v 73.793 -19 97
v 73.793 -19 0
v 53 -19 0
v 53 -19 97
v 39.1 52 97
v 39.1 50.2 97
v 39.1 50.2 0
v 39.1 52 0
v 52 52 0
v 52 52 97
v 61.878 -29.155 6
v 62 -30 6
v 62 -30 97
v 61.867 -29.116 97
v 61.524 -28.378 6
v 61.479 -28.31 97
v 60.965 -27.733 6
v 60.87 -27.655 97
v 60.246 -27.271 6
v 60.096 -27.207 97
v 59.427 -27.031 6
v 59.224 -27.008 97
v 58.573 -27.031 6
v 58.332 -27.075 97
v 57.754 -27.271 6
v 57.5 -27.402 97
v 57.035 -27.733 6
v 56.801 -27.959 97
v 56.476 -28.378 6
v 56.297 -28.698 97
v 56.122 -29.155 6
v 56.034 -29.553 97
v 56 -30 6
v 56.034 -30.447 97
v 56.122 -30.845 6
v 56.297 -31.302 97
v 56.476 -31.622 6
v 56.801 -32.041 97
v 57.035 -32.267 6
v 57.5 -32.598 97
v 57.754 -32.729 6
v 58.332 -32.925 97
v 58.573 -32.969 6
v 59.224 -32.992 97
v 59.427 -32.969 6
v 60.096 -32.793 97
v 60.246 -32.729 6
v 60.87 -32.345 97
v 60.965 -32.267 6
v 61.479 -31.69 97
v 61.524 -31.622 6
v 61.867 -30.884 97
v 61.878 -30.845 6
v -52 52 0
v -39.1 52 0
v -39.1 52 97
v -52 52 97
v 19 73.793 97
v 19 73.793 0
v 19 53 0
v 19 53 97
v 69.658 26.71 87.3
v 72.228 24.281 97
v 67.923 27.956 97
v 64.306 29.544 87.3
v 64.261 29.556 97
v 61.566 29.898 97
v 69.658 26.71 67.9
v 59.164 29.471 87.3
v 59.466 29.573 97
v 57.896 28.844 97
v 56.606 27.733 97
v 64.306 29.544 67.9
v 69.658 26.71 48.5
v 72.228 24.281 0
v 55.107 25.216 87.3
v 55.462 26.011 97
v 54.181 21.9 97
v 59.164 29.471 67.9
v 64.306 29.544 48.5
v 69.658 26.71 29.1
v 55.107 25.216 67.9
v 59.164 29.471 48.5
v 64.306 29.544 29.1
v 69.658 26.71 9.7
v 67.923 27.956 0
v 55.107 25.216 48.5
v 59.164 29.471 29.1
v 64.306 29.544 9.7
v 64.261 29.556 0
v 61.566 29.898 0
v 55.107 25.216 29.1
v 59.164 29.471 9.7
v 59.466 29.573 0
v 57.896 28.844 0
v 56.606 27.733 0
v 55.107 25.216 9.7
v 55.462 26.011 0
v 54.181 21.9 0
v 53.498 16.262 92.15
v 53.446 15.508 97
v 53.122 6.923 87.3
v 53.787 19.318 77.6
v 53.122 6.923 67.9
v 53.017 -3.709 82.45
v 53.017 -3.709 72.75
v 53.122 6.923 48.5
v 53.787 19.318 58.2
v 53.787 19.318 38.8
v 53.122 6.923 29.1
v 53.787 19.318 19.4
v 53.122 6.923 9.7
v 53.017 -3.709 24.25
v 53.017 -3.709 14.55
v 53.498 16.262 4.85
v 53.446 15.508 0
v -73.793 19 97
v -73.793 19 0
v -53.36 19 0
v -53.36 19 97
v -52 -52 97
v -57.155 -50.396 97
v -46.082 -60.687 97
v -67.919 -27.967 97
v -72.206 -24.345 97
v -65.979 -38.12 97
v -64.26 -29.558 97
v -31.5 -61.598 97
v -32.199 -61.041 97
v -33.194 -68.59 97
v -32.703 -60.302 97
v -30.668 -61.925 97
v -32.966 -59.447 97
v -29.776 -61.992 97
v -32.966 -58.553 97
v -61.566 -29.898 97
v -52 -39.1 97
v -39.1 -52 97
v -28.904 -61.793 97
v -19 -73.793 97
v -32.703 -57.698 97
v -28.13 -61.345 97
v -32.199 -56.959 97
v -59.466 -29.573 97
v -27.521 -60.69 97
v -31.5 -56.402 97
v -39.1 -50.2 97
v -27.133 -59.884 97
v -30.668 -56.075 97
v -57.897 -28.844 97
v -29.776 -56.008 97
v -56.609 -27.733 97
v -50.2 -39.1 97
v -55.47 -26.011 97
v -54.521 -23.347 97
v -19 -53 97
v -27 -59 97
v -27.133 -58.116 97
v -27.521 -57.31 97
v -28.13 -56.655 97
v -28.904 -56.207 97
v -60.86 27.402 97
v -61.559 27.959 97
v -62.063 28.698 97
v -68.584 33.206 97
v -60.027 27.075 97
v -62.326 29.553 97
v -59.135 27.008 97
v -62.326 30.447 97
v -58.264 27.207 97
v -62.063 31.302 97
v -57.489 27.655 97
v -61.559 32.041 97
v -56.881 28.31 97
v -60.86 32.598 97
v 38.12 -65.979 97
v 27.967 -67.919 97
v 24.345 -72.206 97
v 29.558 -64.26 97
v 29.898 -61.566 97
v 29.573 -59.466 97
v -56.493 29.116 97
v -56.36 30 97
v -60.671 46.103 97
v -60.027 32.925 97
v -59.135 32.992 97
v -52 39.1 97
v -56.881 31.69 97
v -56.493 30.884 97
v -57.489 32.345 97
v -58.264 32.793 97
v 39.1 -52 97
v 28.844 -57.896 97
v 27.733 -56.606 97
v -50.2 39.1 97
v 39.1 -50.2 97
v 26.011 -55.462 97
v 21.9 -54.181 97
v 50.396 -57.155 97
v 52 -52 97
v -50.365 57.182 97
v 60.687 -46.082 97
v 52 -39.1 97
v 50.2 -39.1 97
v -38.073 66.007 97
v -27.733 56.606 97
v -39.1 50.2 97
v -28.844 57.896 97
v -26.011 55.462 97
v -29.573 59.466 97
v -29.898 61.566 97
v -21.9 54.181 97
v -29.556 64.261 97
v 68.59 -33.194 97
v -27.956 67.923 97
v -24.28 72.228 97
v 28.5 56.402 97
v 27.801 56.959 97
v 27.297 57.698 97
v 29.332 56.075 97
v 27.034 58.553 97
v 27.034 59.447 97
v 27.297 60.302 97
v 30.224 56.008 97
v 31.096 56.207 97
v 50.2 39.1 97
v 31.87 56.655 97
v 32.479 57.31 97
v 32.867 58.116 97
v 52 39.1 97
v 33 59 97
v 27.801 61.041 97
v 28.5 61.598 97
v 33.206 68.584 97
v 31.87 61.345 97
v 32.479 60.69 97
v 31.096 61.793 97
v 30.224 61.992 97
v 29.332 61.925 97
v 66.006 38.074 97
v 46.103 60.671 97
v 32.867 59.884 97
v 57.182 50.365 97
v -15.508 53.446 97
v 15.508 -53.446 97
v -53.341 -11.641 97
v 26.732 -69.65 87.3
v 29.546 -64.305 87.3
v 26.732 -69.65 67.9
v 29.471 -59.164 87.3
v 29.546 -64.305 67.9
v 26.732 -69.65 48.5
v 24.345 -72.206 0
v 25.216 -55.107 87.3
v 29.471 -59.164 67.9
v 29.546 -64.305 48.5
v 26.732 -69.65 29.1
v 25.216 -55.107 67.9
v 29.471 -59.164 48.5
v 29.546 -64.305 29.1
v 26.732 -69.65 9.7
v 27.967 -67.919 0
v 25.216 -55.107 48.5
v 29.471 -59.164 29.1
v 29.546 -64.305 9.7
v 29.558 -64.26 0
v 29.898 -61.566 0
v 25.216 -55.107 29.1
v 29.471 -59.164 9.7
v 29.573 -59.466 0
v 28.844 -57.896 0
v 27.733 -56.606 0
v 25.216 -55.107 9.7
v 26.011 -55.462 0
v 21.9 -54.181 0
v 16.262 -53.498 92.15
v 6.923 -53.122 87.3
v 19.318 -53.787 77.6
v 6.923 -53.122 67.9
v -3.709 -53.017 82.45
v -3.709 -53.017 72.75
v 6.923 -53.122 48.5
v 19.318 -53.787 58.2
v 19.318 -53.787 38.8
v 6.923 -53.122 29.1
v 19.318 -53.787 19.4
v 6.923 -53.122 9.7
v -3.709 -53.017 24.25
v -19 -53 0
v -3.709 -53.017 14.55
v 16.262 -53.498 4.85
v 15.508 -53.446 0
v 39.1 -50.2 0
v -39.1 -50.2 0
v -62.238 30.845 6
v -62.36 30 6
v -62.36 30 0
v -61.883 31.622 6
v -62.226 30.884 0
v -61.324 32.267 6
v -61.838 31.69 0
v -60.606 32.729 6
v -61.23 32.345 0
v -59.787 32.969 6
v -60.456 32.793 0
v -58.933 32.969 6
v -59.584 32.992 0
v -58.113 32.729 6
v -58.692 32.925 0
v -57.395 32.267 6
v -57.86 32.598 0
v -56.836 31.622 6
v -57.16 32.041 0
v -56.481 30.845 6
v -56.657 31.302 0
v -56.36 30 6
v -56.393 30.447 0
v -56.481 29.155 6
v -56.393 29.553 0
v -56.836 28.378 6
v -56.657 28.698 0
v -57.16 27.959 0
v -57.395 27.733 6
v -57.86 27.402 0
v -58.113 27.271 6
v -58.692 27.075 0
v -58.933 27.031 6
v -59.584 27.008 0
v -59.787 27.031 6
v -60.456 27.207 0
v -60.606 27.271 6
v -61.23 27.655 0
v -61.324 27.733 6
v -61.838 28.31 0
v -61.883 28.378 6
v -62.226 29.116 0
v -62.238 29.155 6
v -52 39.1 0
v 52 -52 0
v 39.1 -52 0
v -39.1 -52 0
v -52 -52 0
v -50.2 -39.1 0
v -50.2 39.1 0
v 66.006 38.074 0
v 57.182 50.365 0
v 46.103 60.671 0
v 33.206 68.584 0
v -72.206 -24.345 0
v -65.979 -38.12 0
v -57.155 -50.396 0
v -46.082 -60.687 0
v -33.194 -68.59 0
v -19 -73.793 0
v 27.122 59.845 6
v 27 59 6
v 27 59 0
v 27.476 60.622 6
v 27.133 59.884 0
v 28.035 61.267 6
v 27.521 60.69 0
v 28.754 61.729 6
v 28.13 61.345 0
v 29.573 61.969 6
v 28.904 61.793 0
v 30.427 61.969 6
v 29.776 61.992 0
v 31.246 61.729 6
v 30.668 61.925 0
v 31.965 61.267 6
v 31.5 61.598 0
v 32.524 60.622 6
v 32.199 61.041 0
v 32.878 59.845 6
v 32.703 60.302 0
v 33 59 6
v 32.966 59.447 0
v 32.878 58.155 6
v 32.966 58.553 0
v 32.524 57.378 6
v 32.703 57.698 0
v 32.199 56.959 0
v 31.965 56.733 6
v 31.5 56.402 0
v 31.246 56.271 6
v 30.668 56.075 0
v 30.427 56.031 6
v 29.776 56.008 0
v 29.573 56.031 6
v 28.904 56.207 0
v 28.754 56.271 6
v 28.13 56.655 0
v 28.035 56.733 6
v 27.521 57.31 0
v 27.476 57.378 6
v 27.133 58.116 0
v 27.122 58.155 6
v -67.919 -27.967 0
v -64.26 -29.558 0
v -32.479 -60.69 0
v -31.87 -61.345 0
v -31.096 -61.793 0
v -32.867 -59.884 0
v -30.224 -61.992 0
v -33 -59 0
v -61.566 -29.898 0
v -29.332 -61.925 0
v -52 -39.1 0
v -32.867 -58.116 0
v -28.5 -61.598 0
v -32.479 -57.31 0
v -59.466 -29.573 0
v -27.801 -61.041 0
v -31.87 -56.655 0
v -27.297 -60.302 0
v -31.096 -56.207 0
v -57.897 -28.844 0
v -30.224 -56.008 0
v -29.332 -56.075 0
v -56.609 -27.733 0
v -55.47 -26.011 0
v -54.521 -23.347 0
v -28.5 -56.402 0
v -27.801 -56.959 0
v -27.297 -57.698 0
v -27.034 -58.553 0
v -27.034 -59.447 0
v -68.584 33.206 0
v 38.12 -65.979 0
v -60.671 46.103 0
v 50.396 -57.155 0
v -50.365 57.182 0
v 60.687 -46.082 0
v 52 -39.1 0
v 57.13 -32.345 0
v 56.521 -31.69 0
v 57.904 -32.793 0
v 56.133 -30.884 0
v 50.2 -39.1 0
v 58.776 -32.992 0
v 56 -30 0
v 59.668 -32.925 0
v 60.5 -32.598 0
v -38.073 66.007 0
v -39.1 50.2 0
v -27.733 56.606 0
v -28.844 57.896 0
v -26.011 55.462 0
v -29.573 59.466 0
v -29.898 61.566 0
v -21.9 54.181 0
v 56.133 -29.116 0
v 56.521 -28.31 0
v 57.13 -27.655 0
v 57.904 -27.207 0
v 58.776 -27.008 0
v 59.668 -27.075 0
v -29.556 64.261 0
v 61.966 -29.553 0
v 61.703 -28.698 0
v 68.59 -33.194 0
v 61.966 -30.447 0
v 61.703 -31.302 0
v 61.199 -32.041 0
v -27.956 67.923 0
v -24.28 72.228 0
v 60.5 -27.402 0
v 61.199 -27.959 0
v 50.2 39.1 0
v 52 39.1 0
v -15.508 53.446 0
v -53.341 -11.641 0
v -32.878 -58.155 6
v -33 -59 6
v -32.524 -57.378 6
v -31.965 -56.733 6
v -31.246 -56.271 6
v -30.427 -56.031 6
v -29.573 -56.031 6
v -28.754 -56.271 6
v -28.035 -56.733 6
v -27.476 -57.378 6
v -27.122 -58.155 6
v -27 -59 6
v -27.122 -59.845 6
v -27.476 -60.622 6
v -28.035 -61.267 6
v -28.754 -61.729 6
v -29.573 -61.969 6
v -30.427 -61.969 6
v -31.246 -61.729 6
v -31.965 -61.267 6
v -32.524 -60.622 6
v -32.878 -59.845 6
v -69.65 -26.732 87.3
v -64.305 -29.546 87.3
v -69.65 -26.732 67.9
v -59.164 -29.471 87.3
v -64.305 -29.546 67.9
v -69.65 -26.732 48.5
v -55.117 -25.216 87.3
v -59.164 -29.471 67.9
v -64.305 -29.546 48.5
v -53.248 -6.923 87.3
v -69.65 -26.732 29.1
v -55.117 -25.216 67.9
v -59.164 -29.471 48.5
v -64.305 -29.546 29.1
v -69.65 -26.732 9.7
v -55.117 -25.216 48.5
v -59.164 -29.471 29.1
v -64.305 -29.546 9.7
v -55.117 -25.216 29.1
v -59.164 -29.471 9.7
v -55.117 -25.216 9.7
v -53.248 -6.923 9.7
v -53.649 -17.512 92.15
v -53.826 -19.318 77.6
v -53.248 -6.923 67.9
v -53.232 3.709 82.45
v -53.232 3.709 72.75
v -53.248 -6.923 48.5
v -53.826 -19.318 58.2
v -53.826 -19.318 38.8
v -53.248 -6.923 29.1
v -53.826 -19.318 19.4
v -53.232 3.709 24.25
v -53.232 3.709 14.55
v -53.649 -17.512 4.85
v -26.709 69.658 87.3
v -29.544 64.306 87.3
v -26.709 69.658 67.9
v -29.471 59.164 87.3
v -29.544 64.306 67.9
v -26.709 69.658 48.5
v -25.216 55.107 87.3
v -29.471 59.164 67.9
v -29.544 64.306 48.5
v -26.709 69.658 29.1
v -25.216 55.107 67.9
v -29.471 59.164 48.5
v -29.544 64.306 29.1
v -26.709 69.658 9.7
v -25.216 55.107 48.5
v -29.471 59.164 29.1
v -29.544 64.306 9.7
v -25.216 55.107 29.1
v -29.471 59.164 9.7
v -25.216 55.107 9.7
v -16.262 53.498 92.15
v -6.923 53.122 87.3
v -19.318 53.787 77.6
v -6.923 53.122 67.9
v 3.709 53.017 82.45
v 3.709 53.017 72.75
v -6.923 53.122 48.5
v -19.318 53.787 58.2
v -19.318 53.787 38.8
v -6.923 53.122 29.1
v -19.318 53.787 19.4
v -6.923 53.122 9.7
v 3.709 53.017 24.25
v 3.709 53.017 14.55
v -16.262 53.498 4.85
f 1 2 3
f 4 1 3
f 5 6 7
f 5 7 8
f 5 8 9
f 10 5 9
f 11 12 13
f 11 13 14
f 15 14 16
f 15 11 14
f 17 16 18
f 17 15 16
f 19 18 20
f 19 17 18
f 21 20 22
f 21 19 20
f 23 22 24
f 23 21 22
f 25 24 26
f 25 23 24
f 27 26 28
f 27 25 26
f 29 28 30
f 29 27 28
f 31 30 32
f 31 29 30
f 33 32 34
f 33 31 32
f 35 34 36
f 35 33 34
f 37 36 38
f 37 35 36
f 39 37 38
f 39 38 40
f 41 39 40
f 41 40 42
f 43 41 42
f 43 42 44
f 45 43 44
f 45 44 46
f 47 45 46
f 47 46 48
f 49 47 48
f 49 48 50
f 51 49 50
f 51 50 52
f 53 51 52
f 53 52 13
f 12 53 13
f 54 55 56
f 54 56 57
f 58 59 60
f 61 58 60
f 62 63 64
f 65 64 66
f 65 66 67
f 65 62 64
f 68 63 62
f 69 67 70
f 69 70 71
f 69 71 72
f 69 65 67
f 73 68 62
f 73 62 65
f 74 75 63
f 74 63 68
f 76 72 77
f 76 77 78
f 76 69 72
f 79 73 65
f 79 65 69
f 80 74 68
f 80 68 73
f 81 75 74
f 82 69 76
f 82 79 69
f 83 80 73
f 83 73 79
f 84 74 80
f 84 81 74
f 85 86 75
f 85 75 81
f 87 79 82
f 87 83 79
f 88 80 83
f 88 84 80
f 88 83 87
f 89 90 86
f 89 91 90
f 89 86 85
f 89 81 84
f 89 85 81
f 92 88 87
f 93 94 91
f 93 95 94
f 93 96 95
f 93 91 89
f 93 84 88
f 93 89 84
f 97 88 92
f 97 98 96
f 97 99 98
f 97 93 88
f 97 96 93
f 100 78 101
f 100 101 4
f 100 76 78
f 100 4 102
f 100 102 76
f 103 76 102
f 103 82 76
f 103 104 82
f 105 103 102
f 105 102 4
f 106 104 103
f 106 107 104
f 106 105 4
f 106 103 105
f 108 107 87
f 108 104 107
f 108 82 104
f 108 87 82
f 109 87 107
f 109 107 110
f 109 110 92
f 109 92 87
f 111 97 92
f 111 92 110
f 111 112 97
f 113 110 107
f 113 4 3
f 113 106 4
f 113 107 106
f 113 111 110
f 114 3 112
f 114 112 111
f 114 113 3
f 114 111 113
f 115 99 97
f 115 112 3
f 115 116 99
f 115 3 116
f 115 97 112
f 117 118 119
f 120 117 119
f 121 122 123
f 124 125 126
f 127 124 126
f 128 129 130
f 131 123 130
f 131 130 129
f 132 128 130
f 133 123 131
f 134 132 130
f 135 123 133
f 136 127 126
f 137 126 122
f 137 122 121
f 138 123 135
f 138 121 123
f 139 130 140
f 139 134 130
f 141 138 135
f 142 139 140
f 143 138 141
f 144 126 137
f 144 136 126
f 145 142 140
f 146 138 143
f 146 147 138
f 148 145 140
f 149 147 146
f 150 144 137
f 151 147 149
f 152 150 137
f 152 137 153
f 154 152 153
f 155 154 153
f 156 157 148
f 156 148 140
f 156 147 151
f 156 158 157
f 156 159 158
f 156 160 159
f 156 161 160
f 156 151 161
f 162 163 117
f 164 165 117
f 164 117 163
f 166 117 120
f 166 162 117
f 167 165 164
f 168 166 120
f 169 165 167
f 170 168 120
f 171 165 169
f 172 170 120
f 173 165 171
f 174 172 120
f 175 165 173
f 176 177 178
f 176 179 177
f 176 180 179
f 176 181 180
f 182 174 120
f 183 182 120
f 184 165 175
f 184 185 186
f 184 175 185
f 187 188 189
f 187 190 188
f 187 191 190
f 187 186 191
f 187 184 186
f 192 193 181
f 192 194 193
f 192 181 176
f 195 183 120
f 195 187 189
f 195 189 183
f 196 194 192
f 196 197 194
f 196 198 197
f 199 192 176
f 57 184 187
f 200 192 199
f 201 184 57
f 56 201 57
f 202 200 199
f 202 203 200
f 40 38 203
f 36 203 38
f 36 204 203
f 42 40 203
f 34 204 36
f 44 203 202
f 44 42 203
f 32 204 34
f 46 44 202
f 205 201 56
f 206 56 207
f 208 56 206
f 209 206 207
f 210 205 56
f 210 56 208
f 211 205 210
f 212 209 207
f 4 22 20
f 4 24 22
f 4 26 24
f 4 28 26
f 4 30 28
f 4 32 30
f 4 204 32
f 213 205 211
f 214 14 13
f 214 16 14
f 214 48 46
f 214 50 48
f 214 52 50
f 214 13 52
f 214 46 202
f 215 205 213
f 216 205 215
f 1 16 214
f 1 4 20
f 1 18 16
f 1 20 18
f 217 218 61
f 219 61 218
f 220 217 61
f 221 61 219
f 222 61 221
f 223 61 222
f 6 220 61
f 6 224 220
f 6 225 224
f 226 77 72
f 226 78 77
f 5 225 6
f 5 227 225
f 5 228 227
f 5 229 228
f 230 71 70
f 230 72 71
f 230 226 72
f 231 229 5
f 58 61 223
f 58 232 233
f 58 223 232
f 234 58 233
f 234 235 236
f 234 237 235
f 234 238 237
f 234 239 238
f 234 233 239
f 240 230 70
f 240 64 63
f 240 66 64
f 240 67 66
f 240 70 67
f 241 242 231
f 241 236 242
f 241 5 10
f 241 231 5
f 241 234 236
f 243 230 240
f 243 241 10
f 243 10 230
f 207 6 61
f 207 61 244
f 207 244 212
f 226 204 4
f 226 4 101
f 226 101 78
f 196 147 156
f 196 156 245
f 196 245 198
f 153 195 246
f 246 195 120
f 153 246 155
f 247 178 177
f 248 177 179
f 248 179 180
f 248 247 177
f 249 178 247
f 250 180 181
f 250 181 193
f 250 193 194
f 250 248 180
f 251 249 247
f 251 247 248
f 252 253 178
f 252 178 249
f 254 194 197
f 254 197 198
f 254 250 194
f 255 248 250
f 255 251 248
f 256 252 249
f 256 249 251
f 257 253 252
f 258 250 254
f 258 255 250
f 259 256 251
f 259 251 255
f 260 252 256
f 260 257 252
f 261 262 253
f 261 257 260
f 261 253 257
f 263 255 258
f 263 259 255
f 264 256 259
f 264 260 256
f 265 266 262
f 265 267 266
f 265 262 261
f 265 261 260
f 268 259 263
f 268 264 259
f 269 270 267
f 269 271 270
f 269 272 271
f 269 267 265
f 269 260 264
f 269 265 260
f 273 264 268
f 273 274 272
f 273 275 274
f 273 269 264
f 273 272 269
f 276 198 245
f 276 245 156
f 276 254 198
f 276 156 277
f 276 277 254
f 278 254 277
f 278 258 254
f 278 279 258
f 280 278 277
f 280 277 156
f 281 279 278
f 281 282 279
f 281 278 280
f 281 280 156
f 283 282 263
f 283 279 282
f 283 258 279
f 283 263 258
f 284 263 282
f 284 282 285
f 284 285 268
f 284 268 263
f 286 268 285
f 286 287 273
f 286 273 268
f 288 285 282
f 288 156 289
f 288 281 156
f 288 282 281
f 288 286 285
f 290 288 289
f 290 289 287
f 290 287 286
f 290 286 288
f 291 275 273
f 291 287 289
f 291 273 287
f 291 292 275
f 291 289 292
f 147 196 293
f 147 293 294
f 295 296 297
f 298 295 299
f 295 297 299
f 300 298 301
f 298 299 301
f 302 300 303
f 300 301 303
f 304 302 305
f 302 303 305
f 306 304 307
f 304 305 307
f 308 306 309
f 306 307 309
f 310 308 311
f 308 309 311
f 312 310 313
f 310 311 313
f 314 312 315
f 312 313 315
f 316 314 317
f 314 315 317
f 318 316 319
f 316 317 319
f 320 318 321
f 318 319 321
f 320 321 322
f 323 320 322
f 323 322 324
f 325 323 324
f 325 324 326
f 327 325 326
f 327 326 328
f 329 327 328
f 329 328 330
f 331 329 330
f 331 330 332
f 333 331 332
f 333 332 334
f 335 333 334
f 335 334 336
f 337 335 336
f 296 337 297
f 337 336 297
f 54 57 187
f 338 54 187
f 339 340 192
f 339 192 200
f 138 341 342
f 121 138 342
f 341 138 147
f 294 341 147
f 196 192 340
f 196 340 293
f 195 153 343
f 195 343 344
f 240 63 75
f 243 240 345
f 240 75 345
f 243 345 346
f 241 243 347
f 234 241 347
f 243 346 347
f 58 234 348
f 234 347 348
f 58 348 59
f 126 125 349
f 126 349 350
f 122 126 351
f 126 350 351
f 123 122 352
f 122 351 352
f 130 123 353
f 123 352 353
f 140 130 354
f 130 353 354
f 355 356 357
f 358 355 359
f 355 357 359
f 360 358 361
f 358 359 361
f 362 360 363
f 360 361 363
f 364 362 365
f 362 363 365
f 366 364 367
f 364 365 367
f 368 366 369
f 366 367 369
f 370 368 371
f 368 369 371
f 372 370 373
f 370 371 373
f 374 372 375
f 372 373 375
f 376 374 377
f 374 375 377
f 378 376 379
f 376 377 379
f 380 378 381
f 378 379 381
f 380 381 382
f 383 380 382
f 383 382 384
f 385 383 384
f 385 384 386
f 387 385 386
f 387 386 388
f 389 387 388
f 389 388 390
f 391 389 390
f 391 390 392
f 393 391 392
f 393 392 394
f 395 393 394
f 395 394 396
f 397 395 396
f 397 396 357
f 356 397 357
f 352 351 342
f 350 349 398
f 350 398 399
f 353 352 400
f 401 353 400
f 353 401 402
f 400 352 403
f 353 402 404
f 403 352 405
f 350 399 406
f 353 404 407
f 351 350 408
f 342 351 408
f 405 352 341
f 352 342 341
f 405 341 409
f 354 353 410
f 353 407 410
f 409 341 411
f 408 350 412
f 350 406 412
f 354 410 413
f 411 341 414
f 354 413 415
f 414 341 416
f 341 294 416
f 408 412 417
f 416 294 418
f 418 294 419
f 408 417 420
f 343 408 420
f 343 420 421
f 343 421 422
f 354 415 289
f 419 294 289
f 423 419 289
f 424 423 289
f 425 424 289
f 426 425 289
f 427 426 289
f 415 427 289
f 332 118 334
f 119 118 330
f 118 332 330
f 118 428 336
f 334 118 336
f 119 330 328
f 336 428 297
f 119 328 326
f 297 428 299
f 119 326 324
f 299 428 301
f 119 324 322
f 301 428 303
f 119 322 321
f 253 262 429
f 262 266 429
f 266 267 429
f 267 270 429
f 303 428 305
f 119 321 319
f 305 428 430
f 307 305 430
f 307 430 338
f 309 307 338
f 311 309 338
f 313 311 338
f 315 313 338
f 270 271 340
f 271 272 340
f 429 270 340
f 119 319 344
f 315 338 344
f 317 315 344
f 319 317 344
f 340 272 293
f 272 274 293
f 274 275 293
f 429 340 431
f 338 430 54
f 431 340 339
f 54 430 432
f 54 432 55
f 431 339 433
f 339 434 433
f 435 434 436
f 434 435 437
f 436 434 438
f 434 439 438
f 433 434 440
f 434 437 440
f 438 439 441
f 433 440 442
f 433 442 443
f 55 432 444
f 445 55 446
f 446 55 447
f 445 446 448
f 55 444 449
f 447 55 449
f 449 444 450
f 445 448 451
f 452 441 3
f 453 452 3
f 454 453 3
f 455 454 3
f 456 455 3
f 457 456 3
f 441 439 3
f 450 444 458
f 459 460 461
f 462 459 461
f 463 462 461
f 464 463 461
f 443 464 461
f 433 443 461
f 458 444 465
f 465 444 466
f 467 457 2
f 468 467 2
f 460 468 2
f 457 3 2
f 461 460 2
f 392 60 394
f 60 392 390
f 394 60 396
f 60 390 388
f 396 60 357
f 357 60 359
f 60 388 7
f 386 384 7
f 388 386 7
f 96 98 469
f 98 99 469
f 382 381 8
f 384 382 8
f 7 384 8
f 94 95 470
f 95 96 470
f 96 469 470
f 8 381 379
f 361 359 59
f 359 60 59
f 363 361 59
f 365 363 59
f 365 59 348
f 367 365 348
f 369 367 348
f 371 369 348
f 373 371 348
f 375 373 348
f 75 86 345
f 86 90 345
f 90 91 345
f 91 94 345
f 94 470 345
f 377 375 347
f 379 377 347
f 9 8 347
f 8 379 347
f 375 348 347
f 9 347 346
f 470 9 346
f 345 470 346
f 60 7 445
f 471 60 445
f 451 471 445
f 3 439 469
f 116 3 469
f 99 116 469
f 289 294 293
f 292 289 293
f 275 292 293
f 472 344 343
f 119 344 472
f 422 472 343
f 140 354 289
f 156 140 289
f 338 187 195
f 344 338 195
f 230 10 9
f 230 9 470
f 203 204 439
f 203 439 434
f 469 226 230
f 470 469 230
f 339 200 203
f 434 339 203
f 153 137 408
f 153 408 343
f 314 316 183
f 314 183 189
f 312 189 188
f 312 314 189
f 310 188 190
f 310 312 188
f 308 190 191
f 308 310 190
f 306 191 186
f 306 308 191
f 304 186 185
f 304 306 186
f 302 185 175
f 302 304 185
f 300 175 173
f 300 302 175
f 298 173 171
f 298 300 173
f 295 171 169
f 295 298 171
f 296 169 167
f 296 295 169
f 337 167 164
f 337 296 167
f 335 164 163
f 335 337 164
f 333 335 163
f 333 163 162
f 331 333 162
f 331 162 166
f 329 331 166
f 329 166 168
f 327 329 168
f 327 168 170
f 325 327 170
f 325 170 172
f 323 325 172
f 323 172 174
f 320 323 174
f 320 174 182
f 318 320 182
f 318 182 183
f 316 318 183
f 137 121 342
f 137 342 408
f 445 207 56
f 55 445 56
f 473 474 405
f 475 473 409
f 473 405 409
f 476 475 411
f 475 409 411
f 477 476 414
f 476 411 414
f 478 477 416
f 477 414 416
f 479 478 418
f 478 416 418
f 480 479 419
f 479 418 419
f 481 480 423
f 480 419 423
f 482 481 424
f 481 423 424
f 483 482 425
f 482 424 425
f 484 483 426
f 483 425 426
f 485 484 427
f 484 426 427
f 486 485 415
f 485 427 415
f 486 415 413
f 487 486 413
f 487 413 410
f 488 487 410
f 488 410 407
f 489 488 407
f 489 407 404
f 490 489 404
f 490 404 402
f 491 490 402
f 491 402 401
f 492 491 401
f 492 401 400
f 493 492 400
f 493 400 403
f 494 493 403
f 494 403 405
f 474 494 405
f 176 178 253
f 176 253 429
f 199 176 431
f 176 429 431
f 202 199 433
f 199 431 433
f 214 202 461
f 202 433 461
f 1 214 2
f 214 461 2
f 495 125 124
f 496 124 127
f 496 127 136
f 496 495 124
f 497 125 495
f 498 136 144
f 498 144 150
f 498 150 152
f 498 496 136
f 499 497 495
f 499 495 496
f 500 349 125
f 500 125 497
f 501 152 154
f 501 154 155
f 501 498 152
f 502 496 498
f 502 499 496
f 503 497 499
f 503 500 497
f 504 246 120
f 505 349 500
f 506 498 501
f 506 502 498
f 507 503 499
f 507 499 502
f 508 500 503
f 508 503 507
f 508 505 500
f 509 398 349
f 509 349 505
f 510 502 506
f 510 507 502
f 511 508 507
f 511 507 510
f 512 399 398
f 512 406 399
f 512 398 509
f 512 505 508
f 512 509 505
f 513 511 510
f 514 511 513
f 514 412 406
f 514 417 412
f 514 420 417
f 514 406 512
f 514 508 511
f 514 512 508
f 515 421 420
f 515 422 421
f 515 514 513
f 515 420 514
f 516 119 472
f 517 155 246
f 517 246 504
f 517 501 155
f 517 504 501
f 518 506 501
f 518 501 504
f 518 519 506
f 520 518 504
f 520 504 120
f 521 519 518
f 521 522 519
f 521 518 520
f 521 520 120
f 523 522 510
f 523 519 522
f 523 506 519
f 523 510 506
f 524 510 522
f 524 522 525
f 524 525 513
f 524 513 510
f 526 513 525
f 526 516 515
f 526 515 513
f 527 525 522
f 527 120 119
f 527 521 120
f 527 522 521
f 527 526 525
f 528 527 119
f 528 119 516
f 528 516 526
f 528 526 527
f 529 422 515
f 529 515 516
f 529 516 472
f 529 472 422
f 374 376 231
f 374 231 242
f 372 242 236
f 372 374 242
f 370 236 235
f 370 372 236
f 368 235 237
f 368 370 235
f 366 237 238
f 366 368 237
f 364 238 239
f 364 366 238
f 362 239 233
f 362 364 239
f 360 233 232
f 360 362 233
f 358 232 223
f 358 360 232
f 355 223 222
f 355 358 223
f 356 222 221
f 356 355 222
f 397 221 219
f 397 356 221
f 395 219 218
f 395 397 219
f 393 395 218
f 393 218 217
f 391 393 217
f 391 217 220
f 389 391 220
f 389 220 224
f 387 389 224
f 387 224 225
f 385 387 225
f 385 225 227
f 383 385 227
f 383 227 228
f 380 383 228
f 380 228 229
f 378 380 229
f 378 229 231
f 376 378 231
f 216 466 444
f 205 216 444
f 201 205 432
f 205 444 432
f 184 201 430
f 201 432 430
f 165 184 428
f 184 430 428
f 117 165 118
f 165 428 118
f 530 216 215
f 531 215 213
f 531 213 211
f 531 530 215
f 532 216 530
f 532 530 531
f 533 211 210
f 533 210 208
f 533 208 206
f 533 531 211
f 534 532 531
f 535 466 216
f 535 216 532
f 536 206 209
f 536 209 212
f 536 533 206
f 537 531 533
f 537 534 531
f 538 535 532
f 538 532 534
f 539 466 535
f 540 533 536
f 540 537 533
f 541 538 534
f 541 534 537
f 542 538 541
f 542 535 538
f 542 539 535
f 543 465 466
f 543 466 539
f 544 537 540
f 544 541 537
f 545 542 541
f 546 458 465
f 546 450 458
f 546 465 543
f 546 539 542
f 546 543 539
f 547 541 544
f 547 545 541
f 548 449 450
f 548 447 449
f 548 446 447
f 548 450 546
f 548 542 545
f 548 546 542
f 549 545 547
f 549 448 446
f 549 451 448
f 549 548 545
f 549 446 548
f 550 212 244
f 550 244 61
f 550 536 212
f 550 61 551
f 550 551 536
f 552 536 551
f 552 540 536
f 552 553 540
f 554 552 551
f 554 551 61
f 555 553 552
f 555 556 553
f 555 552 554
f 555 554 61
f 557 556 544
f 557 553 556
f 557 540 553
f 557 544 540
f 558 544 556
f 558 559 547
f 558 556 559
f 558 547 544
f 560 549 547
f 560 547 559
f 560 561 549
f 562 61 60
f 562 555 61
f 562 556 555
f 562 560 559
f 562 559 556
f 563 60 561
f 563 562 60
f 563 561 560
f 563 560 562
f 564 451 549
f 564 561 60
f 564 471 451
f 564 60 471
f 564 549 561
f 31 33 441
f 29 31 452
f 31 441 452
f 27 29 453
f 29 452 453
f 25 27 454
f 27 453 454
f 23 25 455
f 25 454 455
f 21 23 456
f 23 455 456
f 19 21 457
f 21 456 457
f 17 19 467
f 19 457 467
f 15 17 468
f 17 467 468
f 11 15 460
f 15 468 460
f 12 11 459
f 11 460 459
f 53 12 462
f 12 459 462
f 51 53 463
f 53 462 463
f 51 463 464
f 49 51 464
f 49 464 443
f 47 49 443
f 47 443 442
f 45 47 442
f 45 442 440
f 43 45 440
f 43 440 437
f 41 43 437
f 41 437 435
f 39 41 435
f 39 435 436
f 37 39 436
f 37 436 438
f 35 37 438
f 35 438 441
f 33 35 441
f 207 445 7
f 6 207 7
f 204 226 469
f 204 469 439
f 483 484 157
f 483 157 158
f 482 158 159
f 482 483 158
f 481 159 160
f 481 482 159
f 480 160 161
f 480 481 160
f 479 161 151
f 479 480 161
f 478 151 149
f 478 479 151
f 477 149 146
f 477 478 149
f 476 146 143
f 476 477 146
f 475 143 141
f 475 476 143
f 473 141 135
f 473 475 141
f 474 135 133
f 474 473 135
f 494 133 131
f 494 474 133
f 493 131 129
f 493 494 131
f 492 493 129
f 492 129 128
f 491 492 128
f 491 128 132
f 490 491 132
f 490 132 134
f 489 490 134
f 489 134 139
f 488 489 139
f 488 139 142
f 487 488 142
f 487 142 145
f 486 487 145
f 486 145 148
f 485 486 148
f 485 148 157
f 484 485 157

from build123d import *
from build123d.topology import SkipClean

# Parameters (mm, degrees)
BOSS_EXTRUDE3_OUTLINE_R = 3
BOSS_EXTRUDE3_DEPTH     = 97
SKETCH3_R               = 3
BOSS_EXTRUDE4_DEPTH     = 5
BOSS_EXTRUDE5_OUTLINE_R = 3
BOSS_EXTRUDE5_DEPTH     = 6
CUT_EXTRUDE2_DEPTH      = 6
CUT_EXTRUDE6_DEPTH      = 97
CUT_EXTRUDE9_DEPTH      = 97
SKETCH9_W               = 0.4
SKETCH9_H               = 1.8
SKETCH9_W_2             = 1.8
SKETCH9_H_2             = 0.4
BOSS_EXTRUDE6_DEPTH     = 97
SKETCH6_R               = 6.726787931
SKETCH6_R_2             = 3
SKETCH6_R_3             = 6.939010835
SKETCH6_R_4             = 7.483441293
SKETCH6_R_5             = 7.426515464
BOSS_EXTRUDE9_DEPTH     = 6
BOSS_EXTRUDE8_DEPTH     = 97


# Read off the part's stored shape, not the designer's step: Boss-Extrude3, Boss-Extrude5, Cut-Extrude2
with BuildPart() as part:
    # Boss-Extrude3 outline → Boss-Extrude3 (new body)
    with BuildSketch(Plane.XY):
        with BuildLine():
            ThreePointArc((-24.28, 72.228260397), (-55.793380191, 51.899313356), (-73.793224621, 19))
            Line((-73.793224621, 19), (-53.359615493, 19))
            add(Edge.make_bspline(
                [(-72.206415586, -24.344887517), (-69.541086329, -27.040667073), (-67.428574969, -29.089162938), (-64.355831171, -30.241441862), (-60.963009895, -31.073643307), (-59.042545022, -30.561519341), (-56.673971678, -29.217193929), (-54.241382838, -27.488775543), (-53, -25.105954954), (-53, -17.37432721), (-53.359615493, 19)],
                knots=[0, 0, 0, 0, 0, 0, 0, 0, 0, 0, 0, 1, 1, 1, 1, 1, 1, 1, 1, 1, 1, 1], degree=10))
            ThreePointArc((-72.206415586, -24.344887517), (-51.874242853, -55.816690411), (-19, -73.793224621))
            Line((-19, -73.793224621), (-19, -53))
            add(Edge.make_bspline(
                [(24.344887517, -72.206415586), (27.040667073, -69.541086329), (29.089162938, -67.428574969), (30.241441862, -64.355831171), (31.073643307, -60.963009895), (30.561519341, -59.042545022), (29.217193929, -56.673971678), (27.488775543, -54.241382838), (25.105954954, -53), (17.37432721, -53), (-19, -53)],
                knots=[0, 0, 0, 0, 0, 0, 0, 0, 0, 0, 0, 1, 1, 1, 1, 1, 1, 1, 1, 1, 1, 1], degree=10))
            ThreePointArc((24.344887517, -72.206415586), (55.816690411, -51.874242853), (73.793224621, -19))
            Line((73.793224621, -19), (53, -19))
            add(Edge.make_bspline(
                [(72.227927536, 24.280990174), (69.541086329, 27.040667073), (67.428574969, 29.089162938), (64.355831171, 30.241441862), (60.963009895, 31.073643307), (59.042545022, 30.561519341), (56.673971678, 29.217193929), (54.241382838, 27.488775543), (53, 25.105954954), (53, 17.37432721), (53, -19)],
                knots=[0, 0, 0, 0, 0, 0, 0, 0, 0, 0, 0, 1, 1, 1, 1, 1, 1, 1, 1, 1, 1, 1], degree=10))
            ThreePointArc((72.227927536, 24.280990174), (51.89893092, 55.793735933), (19, 73.793224621))
            Line((19, 73.793224621), (19, 53))
            add(Edge.make_bspline(
                [(-24.28, 72.228260397), (-27.040667073, 69.541086329), (-29.089162938, 67.428574969), (-30.241441862, 64.355831171), (-31.073643307, 60.963009895), (-30.561519341, 59.042545022), (-29.217193929, 56.673971678), (-27.488775543, 54.241382838), (-25.105954954, 53), (-17.37432721, 53), (19, 53)],
                knots=[0, 0, 0, 0, 0, 0, 0, 0, 0, 0, 0, 1, 1, 1, 1, 1, 1, 1, 1, 1, 1, 1], degree=10))
        make_face()
        with Locations((-30, -59)):
            Circle(BOSS_EXTRUDE3_OUTLINE_R, mode=Mode.SUBTRACT)
        Polygon((-38.9, -51.6), (-51.6, -51.6), (-51.6, -38.9), (-50, -38.9), (-50, 38.9), (-51.6, 38.9), (-51.6, 51.6), (-38.9, 51.6), (-38.9, 50), (38.9, 50), (38.9, 51.6), (51.6, 51.6), (51.6, 38.9), (50, 38.9), (50, -38.9), (51.6, -38.9), (51.6, -51.6), (38.9, -51.6), (38.9, -50), (-38.9, -50), align=None, mode=Mode.SUBTRACT)
        with Locations((59, -30)):
            Circle(BOSS_EXTRUDE3_OUTLINE_R, mode=Mode.SUBTRACT)
        with Locations((-59.359615493, 30)):
            Circle(BOSS_EXTRUDE3_OUTLINE_R, mode=Mode.SUBTRACT)
        with Locations((30, 59)):
            Circle(BOSS_EXTRUDE3_OUTLINE_R, mode=Mode.SUBTRACT)
    extrude(amount=BOSS_EXTRUDE3_DEPTH)

    # Sketch3 → Boss-Extrude4 (add)
    with BuildSketch(Plane.XY.offset(97)):
        with Locations(Location((-59.359615493, 30, 0), (0, 0, 180))):
            Circle(SKETCH3_R)
    extrude(amount=BOSS_EXTRUDE4_DEPTH)


with BuildPart() as boss_extrude4_kept_piece:
    # of the separate pieces the step leaves, the one the design keeps (boss_extrude4_pieces_kept)
    add(part.part.solids().sort_by_distance((-24.28, 72.228260397, 0))[0])

    # Boss-Extrude5 outline → Boss-Extrude5 (add)
    with BuildSketch(Plane.XY):
        with Locations((-59.359615493, 30)):
            Circle(BOSS_EXTRUDE5_OUTLINE_R)
    extrude(amount=BOSS_EXTRUDE5_DEPTH)

    # Cut-Extrude2 outline → Cut-Extrude2 (cut)
    with BuildSketch(Plane.XY):
        Polygon((-32.75, -54.236860279), (-35.5, -59), (-32.75, -63.763139721), (-27.25, -63.763139721), (-24.5, -59), (-27.25, -54.236860279), align=None)
        Polygon((59, -24.5), (54.236860279, -27.25), (54.236860279, -32.75), (59, -35.5), (63.763139721, -32.75), (63.763139721, -27.25), align=None)
        Polygon((-59.359615493, 35.5), (-64.122755214, 32.75), (-64.122755214, 27.25), (-59.359615493, 24.5), (-54.596475772, 27.25), (-54.596475772, 32.75), align=None)
        Polygon((32.75, 63.763139721), (27.25, 63.763139721), (24.5, 59), (27.25, 54.236860279), (32.75, 54.236860279), (35.5, 59), align=None)
    extrude(amount=CUT_EXTRUDE2_DEPTH, mode=Mode.SUBTRACT)

    # Sketch7 → Cut-Extrude6 (cut)
    with BuildSketch(Plane.XY.offset(97)):
        Polygon((-38.7, -51.8), (-51.8, -51.8), (-51.8, -38.7), (-50.2, -38.7), (-50.2, 38.7), (-51.8, 38.7), (-51.8, 51.8), (-38.7, 51.8), (-38.7, 50.2), (38.7, 50.2), (38.7, 51.8), (51.8, 51.8), (51.8, 38.7), (50.2, 38.7), (50.2, -38.7), (51.8, -38.7), (51.8, -51.8), (38.7, -51.8), (38.7, -50.2), (-38.7, -50.2), align=None)
        Polygon((-38.9, -51.6), (-51.6, -51.6), (-51.6, -38.9), (-50, -38.9), (-50, 38.9), (-51.6, 38.9), (-51.6, 51.6), (-38.9, 51.6), (-38.9, 50), (38.9, 50), (38.9, 51.6), (51.6, 51.6), (51.6, 38.9), (50, 38.9), (50, -38.9), (51.6, -38.9), (51.6, -51.6), (38.9, -51.6), (38.9, -50), (-38.9, -50), align=None, mode=Mode.SUBTRACT)
    extrude(amount=-CUT_EXTRUDE6_DEPTH, mode=Mode.SUBTRACT)

    # Sketch8 → Cut-Extrude9 (cut)
    with BuildSketch(Plane.XY.offset(97)):
        Polygon((-51.8, 38.7), (-51.8, 51.8), (-38.7, 51.8), (-38.7, 52), (-52, 52), (-52, 38.7), align=None)
        Polygon((-51.8, -38.7), (-51.8, -51.8), (-38.7, -51.8), (-38.7, -52), (-52, -52), (-52, -38.7), align=None)
        Polygon((51.8, -38.7), (51.8, -51.8), (38.7, -51.8), (38.7, -52), (52, -52), (52, -38.7), align=None)
        Polygon((51.8, 38.7), (51.8, 51.8), (38.7, 51.8), (38.7, 52), (52, 52), (52, 38.7), align=None)
    extrude(amount=-CUT_EXTRUDE9_DEPTH, mode=Mode.SUBTRACT)

    # Sketch9 → Boss-Extrude6 (add)
    with BuildSketch(Plane.XY.offset(97)):
        with Locations((-38.9, 51.1)):
            Rectangle(SKETCH9_W, SKETCH9_H)
        with Locations((-51.1, 38.9)):
            Rectangle(SKETCH9_W_2, SKETCH9_H_2)
        with Locations((38.9, 51.1)):
            Rectangle(SKETCH9_W, SKETCH9_H)
        with Locations((51.1, 38.9)):
            Rectangle(SKETCH9_W_2, SKETCH9_H_2)
        with Locations((51.1, -38.9)):
            Rectangle(SKETCH9_W_2, SKETCH9_H_2)
        with Locations((38.9, -51.1)):
            Rectangle(SKETCH9_W, SKETCH9_H)
        with Locations((-51.1, -38.9)):
            Rectangle(SKETCH9_W_2, SKETCH9_H_2)
        with Locations((-38.9, -51.1)):
            Rectangle(SKETCH9_W, SKETCH9_H)
    extrude(amount=-BOSS_EXTRUDE6_DEPTH)

    # Sketch6 → Boss-Extrude9 (add)
    # profile 1 of 4: a face of its own
    with SkipClean():  # the faces are left unmerged after this step: merging them gives an invalid solid
        with BuildSketch(Plane(origin=(0, 0, 0), x_dir=(-1, 0, 0), z_dir=(0, 0, -1))):
            with Locations((-30, 59)):
                Circle(SKETCH6_R)
            with Locations((-30, 59)):
                Circle(SKETCH6_R_2, mode=Mode.SUBTRACT)
        # profile 2 of 4: a face of its own
        with BuildSketch(Plane(origin=(0, 0, 0), x_dir=(-1, 0, 0), z_dir=(0, 0, -1))):
            with Locations((59.359615493, 30)):
                Circle(SKETCH6_R_3)
            with Locations((59.359615493, 30)):
                Circle(SKETCH6_R_2, mode=Mode.SUBTRACT)
        # profile 3 of 4: a face of its own
        with BuildSketch(Plane(origin=(0, 0, 0), x_dir=(-1, 0, 0), z_dir=(0, 0, -1))):
            with Locations((30, -59)):
                Circle(SKETCH6_R_4)
            with Locations((30, -59)):
                Circle(SKETCH6_R_2, mode=Mode.SUBTRACT)
        # profile 4 of 4: a face of its own
        with BuildSketch(Plane(origin=(0, 0, 0), x_dir=(-1, 0, 0), z_dir=(0, 0, -1))):
            with Locations((-59, -30)):
                Circle(SKETCH6_R_5)
            with Locations((-59, -30)):
                Circle(SKETCH6_R_2, mode=Mode.SUBTRACT)
        extrude(amount=-BOSS_EXTRUDE9_DEPTH)

    # Sketch11 → Boss-Extrude8 (add)
    with SkipClean():  # the faces are left unmerged after this step: merging them gives an invalid solid
        with BuildSketch(Plane.XY.offset(97)):
            with BuildLine():
                ThreePointArc((-73.793224621, 19), (-76.148989183, -2.787731402), (-72.206415586, -24.344887517))
                add(Edge.make_bspline(
                    [(-53.359615493, 19), (-53, -17.37432721), (-53, -25.105954954), (-54.241382838, -27.488775543), (-56.673971678, -29.217193929), (-59.042545022, -30.561519341), (-60.963009895, -31.073643307), (-64.355831171, -30.241441862), (-67.428574969, -29.089162938), (-69.541086329, -27.040667073), (-72.206415586, -24.344887517)],
                    knots=[0, 0, 0, 0, 0, 0, 0, 0, 0, 0, 0, 1, 1, 1, 1, 1, 1, 1, 1, 1, 1, 1], degree=10))
                Line((-53.359615493, 19), (-73.793224621, 19))
            make_face()
        extrude(amount=BOSS_EXTRUDE8_DEPTH)


with BuildPart() as boss_extrude8_kept_piece:
    # of the separate pieces the step leaves, the one the design keeps (boss_extrude8_pieces_kept)
    add(boss_extrude4_kept_piece.part.solids().sort_by_distance((-24.28, 72.228260397, 0))[0])


solid = boss_extrude8_kept_piece.part
